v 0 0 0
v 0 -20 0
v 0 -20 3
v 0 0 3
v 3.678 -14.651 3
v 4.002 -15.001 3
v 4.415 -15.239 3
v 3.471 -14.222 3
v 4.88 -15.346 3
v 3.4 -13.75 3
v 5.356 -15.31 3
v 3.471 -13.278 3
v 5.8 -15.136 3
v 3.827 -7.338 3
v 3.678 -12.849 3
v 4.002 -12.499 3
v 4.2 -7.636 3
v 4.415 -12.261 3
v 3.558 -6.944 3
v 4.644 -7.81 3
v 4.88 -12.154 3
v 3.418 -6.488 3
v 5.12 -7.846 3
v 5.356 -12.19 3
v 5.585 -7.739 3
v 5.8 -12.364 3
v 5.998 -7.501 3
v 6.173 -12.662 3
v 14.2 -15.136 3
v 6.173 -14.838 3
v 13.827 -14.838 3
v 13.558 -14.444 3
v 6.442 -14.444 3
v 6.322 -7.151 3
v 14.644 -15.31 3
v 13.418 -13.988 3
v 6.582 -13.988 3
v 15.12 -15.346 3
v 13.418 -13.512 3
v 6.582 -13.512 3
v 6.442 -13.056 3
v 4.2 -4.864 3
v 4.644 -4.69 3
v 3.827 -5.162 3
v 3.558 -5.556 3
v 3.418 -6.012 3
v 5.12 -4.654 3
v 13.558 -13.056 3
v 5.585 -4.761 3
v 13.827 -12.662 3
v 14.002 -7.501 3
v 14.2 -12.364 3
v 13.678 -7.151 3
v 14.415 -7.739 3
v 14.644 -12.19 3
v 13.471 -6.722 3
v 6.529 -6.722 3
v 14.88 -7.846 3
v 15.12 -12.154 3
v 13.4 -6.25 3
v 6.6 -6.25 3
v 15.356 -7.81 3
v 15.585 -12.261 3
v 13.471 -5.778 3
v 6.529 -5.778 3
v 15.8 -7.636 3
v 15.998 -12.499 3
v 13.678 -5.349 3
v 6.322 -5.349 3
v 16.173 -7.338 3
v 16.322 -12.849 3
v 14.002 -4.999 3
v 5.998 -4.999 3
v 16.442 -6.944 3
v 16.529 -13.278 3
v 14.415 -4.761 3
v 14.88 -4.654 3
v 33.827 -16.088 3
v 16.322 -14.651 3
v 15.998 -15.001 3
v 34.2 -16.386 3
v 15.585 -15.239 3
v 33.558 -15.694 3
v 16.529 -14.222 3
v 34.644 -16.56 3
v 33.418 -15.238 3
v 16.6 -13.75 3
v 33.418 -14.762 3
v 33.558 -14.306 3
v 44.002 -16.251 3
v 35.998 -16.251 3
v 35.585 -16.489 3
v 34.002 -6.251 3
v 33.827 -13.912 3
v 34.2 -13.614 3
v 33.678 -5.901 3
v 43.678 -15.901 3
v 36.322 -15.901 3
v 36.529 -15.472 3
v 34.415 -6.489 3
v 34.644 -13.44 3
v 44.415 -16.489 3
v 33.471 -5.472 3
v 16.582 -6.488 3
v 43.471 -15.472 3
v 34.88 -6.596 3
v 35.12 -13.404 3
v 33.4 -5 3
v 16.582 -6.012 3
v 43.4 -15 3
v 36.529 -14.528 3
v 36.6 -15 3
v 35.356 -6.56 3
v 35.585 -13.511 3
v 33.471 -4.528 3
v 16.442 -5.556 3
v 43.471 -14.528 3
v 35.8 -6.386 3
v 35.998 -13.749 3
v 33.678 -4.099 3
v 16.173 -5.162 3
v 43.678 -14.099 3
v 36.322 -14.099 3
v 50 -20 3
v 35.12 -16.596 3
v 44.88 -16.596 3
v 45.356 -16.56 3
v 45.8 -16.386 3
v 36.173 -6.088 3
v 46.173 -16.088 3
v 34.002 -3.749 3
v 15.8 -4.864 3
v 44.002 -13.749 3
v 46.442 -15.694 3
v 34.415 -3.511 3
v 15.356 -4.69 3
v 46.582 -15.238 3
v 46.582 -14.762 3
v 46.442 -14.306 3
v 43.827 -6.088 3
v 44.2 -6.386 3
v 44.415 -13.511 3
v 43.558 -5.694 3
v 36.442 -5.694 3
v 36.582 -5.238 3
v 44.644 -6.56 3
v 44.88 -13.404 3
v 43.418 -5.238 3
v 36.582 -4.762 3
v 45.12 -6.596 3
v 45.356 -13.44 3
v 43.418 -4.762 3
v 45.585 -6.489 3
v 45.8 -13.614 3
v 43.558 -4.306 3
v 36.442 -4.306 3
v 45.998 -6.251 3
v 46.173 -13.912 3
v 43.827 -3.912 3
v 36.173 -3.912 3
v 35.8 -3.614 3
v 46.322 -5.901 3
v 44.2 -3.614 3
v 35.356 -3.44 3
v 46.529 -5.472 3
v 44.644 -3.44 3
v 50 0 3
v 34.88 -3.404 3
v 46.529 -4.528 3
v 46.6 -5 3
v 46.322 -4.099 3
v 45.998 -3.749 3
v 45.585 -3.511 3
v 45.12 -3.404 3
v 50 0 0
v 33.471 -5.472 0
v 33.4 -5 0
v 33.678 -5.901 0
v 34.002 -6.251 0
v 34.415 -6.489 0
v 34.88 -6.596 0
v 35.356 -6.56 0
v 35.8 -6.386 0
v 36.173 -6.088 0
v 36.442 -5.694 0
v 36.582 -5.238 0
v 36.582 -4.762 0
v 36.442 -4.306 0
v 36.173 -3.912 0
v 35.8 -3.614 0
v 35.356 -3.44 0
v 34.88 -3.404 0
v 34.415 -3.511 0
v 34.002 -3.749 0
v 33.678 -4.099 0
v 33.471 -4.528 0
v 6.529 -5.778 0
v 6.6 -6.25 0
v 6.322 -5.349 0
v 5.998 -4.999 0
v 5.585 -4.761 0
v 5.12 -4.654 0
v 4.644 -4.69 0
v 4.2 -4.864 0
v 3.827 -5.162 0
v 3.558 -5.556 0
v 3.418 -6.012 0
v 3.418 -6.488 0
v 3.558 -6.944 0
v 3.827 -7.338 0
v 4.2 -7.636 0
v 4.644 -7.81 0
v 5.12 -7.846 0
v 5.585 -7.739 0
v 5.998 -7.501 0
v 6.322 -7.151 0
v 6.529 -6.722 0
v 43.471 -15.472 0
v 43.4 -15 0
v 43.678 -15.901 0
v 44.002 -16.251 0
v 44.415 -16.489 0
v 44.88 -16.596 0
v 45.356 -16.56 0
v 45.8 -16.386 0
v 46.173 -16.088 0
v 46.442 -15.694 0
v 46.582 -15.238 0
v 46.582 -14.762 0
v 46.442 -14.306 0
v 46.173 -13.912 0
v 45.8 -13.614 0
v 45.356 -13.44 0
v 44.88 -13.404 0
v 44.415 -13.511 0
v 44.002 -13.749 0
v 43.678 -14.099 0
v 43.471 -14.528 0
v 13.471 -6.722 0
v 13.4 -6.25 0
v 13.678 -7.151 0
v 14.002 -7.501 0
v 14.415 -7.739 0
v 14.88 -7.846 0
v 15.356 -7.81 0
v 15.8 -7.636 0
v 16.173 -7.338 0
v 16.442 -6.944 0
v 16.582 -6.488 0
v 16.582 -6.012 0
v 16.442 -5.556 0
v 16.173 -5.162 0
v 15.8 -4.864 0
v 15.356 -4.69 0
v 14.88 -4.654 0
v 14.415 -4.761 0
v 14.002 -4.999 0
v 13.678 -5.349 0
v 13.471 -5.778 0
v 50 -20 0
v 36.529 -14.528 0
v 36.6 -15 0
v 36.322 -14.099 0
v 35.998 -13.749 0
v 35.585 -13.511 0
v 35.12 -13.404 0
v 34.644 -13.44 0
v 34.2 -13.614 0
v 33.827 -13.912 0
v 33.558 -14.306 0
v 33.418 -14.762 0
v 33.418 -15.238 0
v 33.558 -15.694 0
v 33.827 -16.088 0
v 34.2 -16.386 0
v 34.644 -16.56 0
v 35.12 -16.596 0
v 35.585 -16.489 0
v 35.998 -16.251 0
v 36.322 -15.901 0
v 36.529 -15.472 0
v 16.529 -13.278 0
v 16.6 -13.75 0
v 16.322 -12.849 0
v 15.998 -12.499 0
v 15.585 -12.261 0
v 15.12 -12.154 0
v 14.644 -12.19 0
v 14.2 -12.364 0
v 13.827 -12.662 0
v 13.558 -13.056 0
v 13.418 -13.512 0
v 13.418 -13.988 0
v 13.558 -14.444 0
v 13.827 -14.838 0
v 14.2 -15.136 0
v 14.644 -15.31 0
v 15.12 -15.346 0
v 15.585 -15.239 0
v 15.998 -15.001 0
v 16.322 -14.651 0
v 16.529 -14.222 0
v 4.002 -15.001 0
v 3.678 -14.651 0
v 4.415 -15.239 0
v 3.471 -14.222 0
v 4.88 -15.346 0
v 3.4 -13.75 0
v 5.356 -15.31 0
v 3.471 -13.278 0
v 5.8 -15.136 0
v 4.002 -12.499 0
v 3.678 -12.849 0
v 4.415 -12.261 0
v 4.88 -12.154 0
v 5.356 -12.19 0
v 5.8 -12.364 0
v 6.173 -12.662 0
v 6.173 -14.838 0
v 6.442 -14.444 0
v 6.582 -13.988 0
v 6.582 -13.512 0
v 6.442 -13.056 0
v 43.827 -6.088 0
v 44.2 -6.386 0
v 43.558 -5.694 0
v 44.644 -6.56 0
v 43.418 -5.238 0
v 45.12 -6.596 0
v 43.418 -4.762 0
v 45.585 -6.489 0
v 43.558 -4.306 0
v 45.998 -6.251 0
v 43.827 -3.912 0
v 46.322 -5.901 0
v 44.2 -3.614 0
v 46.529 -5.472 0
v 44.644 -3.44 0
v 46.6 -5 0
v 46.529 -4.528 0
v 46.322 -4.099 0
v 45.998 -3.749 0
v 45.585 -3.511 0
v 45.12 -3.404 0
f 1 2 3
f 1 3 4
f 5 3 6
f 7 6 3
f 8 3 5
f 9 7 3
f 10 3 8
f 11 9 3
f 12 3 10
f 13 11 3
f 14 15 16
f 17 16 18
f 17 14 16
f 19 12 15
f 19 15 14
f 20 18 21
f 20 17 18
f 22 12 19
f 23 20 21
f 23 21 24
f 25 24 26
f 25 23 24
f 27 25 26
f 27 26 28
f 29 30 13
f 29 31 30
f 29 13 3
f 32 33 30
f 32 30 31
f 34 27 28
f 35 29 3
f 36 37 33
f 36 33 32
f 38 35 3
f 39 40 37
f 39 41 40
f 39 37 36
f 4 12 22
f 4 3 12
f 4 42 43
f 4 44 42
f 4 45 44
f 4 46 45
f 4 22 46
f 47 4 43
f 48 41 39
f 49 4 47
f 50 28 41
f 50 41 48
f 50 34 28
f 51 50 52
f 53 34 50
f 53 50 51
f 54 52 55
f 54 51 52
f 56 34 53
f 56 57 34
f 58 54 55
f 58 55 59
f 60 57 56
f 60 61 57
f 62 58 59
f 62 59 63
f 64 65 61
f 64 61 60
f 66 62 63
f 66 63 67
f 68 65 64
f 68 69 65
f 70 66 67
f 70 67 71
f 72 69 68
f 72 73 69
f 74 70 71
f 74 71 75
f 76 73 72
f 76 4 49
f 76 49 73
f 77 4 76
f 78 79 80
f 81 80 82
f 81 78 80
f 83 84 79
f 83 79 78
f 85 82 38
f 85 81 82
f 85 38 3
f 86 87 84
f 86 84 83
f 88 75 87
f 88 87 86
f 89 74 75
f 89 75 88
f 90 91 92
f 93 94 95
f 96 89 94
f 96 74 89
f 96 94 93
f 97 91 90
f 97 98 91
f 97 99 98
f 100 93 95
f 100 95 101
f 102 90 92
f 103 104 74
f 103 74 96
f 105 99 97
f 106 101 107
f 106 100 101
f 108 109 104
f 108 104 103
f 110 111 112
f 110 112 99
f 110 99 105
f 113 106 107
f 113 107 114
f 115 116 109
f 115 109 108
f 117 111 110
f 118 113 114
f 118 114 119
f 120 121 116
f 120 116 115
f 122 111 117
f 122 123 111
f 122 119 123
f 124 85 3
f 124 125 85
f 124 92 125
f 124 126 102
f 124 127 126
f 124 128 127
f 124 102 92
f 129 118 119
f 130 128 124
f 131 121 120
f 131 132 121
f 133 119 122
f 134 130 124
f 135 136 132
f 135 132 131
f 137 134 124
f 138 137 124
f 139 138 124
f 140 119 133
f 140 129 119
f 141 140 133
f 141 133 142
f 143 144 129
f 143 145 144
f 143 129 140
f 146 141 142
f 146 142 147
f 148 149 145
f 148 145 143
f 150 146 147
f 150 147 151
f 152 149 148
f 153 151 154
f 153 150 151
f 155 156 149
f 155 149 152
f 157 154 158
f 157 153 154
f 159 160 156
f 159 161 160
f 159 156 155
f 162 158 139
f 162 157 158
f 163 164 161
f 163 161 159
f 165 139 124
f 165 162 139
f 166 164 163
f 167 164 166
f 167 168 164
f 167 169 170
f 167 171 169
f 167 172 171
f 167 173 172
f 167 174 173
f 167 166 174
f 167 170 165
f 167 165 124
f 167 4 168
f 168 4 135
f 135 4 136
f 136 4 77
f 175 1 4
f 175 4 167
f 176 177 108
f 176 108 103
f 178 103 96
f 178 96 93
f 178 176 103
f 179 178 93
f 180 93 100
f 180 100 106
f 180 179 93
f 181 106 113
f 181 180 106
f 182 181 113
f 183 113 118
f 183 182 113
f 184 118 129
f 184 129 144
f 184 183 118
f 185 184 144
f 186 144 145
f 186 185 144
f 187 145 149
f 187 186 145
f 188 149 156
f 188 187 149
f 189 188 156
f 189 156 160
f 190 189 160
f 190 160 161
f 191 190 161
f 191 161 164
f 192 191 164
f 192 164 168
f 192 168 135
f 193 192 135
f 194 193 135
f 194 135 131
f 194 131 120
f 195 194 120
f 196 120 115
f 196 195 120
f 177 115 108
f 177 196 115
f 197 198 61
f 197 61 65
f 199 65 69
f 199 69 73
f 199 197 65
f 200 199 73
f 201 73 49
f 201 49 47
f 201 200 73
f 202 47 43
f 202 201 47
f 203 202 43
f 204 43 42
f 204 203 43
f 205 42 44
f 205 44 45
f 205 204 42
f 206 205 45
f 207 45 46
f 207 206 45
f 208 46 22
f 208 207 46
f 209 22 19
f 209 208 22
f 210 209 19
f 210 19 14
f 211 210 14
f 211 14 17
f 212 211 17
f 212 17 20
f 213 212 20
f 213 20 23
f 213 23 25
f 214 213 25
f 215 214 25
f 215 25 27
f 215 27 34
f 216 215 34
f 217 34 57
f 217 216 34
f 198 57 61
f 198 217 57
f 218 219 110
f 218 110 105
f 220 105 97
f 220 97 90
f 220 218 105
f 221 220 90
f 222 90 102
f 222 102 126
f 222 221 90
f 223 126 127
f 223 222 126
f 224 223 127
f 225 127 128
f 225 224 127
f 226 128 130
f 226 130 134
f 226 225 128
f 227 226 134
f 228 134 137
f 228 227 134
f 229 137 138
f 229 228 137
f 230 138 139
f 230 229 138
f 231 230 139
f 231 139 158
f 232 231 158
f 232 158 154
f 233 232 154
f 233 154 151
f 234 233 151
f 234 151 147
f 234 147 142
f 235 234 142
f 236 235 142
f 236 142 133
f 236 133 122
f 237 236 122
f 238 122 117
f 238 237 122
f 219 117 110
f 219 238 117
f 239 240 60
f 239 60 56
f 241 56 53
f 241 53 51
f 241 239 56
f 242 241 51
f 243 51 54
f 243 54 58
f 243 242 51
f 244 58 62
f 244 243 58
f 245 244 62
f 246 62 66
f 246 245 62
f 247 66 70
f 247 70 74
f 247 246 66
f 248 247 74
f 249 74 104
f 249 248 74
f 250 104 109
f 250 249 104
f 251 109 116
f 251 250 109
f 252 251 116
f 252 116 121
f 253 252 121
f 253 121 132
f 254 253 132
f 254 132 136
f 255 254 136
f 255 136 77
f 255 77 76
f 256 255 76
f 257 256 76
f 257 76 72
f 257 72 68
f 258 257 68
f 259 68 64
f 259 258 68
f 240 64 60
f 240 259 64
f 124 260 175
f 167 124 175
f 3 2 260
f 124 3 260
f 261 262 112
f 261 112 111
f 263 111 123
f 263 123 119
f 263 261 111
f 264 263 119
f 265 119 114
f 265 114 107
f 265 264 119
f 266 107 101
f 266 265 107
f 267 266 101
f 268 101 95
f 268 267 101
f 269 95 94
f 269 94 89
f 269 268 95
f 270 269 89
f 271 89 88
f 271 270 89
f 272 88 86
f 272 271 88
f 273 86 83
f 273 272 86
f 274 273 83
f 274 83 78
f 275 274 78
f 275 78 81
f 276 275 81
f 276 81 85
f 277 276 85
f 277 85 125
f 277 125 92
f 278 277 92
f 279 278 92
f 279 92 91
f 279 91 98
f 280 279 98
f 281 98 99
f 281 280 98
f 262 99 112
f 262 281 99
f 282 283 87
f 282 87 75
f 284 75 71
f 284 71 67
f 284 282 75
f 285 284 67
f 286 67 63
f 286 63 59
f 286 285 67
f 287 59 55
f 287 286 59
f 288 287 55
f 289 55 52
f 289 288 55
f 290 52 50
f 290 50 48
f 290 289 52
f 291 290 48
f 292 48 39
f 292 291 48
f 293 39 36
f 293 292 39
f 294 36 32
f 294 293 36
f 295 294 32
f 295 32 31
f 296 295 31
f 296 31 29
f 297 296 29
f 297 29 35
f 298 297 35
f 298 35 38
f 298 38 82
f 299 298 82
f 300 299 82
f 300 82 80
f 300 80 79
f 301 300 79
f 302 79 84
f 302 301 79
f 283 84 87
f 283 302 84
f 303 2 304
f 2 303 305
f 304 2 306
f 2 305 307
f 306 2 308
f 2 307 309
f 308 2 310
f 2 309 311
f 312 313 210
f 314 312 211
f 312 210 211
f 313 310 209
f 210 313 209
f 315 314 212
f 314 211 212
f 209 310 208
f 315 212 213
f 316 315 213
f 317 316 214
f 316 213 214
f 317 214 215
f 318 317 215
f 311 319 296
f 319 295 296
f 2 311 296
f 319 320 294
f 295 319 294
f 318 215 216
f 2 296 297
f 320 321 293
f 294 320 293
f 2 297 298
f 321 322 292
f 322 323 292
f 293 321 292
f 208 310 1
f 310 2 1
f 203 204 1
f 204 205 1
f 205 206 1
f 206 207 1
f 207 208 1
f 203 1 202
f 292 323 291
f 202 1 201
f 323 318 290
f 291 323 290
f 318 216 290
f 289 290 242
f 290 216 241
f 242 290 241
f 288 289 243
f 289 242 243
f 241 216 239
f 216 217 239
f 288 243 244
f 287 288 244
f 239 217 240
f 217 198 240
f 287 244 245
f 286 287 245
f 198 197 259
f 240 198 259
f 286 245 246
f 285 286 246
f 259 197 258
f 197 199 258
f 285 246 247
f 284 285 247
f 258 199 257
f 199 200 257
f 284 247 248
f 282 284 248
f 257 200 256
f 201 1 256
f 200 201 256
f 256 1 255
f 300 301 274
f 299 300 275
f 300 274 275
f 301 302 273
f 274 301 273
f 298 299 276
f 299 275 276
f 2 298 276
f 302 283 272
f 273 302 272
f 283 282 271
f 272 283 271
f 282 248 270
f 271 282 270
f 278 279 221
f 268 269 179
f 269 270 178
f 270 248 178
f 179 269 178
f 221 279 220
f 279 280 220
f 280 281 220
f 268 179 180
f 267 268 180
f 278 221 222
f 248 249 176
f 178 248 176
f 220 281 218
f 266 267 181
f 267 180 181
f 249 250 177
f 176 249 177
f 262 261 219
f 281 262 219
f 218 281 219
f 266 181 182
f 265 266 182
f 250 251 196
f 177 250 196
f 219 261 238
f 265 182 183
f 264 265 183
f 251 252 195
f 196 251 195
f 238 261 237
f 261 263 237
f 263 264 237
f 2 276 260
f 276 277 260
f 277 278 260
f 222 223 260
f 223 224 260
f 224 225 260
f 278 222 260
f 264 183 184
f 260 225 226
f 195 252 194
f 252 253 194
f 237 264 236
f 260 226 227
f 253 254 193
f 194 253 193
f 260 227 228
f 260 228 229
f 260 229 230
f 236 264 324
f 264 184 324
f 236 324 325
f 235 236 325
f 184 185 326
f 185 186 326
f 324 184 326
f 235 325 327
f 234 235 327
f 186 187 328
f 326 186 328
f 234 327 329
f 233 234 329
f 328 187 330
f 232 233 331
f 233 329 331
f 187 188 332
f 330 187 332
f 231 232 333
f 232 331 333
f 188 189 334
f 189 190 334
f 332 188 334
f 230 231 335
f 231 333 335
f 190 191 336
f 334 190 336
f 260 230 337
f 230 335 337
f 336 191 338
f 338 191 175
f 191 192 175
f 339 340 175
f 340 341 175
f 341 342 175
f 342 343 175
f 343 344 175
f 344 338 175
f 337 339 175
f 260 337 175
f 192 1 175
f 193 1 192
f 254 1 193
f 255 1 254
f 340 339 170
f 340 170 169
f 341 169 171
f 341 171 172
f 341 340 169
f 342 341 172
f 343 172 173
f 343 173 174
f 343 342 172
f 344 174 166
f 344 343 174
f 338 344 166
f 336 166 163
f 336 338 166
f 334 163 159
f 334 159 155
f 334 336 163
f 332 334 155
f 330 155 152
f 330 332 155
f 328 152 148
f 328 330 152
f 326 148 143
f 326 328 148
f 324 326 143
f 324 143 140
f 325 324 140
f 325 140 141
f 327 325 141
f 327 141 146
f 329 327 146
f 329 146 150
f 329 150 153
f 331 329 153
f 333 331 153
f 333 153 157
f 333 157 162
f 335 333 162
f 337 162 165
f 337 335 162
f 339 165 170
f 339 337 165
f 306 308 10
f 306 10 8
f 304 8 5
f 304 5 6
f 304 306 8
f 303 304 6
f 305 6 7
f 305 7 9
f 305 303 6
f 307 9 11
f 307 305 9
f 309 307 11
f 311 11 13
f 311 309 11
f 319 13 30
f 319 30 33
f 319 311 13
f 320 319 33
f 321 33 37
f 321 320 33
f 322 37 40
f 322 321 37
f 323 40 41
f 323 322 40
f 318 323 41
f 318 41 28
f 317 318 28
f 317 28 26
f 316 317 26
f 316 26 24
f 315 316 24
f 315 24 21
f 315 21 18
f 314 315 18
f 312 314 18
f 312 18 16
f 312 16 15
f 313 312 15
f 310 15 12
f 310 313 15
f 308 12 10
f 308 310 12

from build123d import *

# Parameters (mm, degrees)
SKETCH_1_W      = 50
SKETCH_1_H      = 20
SKETCH_1_R      = 1.6
EXTRUDE_1_DEPTH = 3


with BuildPart() as part:
    # 草图1 → 凸台-拉伸1 (new body)
    with BuildSketch(Plane.XY):
        with Locations((25, -10)):
            Rectangle(SKETCH_1_W, SKETCH_1_H)
        with Locations((45, -5)):
            Circle(SKETCH_1_R, mode=Mode.SUBTRACT)
        with Locations(Location((45, -15, 0), (0, 0, 180))):
            Circle(SKETCH_1_R, mode=Mode.SUBTRACT)
        with Locations((35, -15)):
            Circle(SKETCH_1_R, mode=Mode.SUBTRACT)
        with Locations(Location((35, -5, 0), (0, 0, 180))):
            Circle(SKETCH_1_R, mode=Mode.SUBTRACT)
        with Locations((5, -6.25)):
            Circle(SKETCH_1_R, mode=Mode.SUBTRACT)
        with Locations(Location((5, -13.75, 0), (0, 0, 180))):
            Circle(SKETCH_1_R, mode=Mode.SUBTRACT)
        with Locations((15, -13.75)):
            Circle(SKETCH_1_R, mode=Mode.SUBTRACT)
        with Locations(Location((15, -6.25, 0), (0, 0, 180))):
            Circle(SKETCH_1_R, mode=Mode.SUBTRACT)
    extrude(amount=EXTRUDE_1_DEPTH)


solid = part.part
